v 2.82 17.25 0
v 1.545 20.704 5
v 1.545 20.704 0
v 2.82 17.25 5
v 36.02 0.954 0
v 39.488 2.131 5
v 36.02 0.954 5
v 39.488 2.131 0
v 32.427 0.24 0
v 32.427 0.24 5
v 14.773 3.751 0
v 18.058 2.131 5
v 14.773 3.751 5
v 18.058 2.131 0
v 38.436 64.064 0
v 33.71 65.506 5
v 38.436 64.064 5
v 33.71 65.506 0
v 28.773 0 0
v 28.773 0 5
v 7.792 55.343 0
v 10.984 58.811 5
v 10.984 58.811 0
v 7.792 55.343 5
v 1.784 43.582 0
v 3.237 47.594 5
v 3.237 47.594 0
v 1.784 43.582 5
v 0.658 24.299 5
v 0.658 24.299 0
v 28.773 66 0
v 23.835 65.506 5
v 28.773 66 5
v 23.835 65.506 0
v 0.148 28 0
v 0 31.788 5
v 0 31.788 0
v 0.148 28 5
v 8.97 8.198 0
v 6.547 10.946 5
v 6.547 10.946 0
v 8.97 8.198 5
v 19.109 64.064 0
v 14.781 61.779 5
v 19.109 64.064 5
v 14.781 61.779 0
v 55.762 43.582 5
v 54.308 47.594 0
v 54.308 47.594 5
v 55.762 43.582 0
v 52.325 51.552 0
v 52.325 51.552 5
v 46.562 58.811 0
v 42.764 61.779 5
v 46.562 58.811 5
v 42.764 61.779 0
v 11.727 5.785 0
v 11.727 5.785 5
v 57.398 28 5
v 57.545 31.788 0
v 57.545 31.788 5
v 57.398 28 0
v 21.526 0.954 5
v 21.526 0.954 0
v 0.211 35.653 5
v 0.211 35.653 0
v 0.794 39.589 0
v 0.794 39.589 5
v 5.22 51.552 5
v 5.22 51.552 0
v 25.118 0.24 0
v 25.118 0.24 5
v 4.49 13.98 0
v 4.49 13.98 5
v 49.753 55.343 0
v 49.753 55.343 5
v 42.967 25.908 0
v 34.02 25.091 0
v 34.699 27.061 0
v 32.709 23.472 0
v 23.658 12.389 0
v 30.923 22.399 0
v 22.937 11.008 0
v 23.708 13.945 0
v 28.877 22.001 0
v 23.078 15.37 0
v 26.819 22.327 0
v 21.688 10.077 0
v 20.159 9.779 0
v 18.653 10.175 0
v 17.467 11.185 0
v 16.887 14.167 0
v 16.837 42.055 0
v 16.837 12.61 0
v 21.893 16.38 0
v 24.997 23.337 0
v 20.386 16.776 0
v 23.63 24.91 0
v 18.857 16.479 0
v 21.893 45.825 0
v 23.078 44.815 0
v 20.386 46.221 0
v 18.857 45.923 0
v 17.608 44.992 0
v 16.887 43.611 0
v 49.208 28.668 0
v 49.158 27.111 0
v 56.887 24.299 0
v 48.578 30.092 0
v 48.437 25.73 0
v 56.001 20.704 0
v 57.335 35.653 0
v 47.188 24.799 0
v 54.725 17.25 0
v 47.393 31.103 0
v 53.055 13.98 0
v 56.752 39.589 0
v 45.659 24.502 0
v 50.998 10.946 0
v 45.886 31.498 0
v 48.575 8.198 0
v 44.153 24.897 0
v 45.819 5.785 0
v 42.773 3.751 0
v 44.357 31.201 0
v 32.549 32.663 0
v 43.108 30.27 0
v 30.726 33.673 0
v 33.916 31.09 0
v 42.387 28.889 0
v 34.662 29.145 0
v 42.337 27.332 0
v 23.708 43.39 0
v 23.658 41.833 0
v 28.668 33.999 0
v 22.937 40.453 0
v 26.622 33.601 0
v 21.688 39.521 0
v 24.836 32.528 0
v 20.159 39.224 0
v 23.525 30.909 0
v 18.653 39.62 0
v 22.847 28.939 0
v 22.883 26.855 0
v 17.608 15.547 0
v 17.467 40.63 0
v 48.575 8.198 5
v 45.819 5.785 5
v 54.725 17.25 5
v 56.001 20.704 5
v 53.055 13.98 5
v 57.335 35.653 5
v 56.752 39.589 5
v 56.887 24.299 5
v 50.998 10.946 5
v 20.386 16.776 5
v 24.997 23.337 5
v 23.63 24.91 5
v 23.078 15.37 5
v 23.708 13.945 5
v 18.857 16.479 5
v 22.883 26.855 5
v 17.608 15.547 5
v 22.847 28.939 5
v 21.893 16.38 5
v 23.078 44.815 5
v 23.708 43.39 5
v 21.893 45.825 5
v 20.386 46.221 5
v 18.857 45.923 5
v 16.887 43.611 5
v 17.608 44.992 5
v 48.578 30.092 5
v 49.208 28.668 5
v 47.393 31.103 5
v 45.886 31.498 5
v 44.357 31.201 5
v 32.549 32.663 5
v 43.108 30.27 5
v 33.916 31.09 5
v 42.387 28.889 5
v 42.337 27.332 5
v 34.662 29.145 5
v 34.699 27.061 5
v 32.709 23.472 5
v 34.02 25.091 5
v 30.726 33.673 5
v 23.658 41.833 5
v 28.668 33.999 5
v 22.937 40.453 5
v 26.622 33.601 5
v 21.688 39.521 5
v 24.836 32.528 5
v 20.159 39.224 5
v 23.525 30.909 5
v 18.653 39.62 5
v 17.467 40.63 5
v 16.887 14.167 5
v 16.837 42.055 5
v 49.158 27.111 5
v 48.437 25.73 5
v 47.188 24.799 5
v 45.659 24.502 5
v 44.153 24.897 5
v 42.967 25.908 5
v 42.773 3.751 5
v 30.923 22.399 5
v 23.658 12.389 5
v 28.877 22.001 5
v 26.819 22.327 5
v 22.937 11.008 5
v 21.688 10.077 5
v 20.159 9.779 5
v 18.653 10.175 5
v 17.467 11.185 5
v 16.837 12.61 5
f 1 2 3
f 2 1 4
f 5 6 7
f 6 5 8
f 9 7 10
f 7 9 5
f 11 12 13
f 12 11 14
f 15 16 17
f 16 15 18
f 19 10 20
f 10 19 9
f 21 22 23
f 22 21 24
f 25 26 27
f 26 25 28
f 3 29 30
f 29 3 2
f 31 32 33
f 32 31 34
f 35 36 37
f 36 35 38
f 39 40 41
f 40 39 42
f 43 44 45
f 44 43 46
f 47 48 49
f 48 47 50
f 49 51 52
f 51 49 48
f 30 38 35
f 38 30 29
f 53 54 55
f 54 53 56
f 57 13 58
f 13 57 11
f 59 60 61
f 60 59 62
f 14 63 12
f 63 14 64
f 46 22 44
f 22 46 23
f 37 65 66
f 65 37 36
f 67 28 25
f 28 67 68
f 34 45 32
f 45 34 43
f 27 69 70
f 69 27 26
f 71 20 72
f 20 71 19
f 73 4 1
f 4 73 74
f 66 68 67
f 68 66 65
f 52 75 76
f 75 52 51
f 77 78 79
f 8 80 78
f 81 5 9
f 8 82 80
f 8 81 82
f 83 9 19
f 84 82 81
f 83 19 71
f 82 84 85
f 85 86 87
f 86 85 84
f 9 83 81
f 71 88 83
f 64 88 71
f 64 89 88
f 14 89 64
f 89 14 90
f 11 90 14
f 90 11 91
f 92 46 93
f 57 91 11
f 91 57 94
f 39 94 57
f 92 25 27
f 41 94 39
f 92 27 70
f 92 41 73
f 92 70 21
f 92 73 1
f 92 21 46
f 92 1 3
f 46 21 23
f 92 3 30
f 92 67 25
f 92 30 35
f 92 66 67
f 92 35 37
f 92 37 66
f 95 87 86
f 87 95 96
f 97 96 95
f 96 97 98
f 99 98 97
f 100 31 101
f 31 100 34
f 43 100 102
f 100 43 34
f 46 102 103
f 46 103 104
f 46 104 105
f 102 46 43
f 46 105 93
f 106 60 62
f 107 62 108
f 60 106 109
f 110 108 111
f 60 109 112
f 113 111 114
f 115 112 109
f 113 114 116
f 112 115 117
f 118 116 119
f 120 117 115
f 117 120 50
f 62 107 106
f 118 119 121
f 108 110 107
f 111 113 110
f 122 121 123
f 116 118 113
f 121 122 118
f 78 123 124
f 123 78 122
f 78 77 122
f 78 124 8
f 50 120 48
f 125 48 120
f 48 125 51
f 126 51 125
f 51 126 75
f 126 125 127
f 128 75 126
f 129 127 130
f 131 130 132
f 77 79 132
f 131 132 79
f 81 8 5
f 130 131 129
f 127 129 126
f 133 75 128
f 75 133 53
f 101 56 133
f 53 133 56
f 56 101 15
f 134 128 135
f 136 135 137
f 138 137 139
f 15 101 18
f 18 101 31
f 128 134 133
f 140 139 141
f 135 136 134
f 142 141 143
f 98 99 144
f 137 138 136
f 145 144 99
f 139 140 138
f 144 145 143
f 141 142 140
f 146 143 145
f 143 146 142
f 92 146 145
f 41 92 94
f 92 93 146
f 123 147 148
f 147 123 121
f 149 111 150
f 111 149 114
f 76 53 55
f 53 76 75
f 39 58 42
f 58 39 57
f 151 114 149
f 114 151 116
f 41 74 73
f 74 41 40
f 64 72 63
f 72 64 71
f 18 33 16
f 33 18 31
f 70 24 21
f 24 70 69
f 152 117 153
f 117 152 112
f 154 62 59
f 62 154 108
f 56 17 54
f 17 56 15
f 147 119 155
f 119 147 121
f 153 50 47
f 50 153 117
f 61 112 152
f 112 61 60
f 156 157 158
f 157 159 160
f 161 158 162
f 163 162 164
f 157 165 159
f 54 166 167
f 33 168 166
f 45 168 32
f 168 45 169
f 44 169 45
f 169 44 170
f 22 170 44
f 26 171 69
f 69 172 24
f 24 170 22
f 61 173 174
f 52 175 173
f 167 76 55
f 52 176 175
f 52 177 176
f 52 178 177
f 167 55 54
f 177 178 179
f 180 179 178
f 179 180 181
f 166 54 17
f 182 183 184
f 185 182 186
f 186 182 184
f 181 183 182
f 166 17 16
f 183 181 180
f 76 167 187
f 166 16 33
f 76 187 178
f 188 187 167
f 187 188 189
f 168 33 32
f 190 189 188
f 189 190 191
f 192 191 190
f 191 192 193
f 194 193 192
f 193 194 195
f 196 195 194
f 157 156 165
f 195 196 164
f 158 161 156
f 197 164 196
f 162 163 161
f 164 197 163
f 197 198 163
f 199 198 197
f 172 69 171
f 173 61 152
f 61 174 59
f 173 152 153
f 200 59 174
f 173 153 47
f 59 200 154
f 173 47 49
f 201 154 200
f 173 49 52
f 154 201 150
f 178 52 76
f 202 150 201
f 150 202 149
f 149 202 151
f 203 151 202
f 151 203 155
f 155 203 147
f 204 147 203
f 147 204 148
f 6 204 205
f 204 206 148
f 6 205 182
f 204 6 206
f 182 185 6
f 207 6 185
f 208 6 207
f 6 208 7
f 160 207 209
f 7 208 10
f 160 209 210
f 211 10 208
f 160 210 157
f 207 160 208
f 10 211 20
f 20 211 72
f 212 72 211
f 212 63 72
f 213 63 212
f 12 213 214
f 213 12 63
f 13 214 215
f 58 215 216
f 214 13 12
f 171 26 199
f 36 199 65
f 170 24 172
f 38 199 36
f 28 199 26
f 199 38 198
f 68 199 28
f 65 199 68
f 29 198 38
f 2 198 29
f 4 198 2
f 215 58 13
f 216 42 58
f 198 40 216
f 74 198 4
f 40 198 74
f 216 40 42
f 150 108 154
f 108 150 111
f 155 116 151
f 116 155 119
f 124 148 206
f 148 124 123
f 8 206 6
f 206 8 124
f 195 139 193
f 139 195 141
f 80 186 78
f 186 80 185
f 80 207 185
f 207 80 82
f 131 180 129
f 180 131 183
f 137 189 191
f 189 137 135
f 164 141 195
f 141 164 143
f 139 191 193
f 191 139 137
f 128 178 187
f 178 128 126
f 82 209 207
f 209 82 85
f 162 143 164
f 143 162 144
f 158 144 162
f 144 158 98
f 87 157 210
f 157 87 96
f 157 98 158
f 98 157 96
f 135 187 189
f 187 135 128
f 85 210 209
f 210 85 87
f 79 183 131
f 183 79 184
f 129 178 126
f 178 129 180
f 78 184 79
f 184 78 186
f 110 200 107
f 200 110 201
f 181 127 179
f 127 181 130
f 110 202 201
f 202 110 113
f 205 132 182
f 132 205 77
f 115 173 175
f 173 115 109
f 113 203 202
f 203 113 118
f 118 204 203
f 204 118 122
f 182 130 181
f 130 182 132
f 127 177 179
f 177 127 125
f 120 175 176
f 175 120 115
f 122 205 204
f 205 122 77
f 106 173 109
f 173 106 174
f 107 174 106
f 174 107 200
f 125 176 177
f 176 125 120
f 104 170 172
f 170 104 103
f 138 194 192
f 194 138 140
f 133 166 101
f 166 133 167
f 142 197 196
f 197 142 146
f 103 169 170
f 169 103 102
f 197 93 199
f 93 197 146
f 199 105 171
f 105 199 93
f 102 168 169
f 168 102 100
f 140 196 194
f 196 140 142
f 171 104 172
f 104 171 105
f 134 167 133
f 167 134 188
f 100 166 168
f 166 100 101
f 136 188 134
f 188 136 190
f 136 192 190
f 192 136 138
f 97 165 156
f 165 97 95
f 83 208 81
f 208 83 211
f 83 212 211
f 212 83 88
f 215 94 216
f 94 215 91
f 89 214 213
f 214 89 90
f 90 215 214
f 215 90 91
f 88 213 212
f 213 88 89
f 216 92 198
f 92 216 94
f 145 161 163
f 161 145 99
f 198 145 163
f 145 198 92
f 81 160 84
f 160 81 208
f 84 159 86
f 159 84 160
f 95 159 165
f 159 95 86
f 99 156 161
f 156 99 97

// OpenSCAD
$fn = 32;

// ----------------------------------------------------------------------
// Cam plate: single_lobe cam, base R28
// ----------------------------------------------------------------------

// --- parameters (mm) ---
base_r = 28;              // base circle radius
lobe_h = 10;              // cam lobe rise
bore_r = 6;               // shaft bore radius
plate_t = 5;              // plate thickness, Z (extrusion height)
ring_r = 17;              // lightening ring radius
bolt_r = 3.5;             // lightening hole radius

profile = [[57.398, 28], [57.545, 31.788], [57.335, 35.653], [56.752, 39.589], [55.762, 43.582], [54.308, 47.594], [52.325, 51.552], [49.753, 55.343], [46.562, 58.811], [42.764, 61.779], [38.436, 64.064], [33.71, 65.506], [28.773, 66], [23.835, 65.506], [19.109, 64.064], [14.781, 61.779], [10.984, 58.811], [7.792, 55.343], [5.22, 51.552], [3.237, 47.594], [1.784, 43.582], [0.794, 39.589], [0.211, 35.653], [0, 31.788], [0.148, 28], [0.658, 24.299], [1.545, 20.704], [2.82, 17.25], [4.49, 13.98], [6.547, 10.946], [8.97, 8.198], [11.727, 5.785], [14.773, 3.751], [18.058, 2.131], [21.526, 0.954], [25.118, 0.24], [28.773, 0], [32.427, 0.24], [36.02, 0.954], [39.488, 2.131], [42.773, 3.751], [45.819, 5.785], [48.575, 8.198], [50.998, 10.946], [53.055, 13.98], [54.725, 17.25], [56.001, 20.704], [56.887, 24.299]];  // primary outline, 48 points, counter clockwise
void_1 = [[34.662, 29.145], [33.916, 31.09], [32.549, 32.663], [30.726, 33.673], [28.668, 33.999], [26.622, 33.601], [24.836, 32.528], [23.525, 30.909], [22.847, 28.939], [22.883, 26.855], [23.63, 24.91], [24.997, 23.337], [26.819, 22.327], [28.877, 22.001], [30.923, 22.399], [32.709, 23.472], [34.02, 25.091], [34.699, 27.061]];  // shaft bore, 18 points
void_2 = [[49.208, 28.668], [48.578, 30.092], [47.393, 31.103], [45.886, 31.498], [44.357, 31.201], [43.108, 30.27], [42.387, 28.889], [42.337, 27.332], [42.967, 25.908], [44.153, 24.897], [45.659, 24.502], [47.188, 24.799], [48.437, 25.73], [49.158, 27.111]];  // lightening hole 1, 14 points
void_3 = [[23.708, 43.39], [23.078, 44.815], [21.893, 45.825], [20.386, 46.221], [18.857, 45.923], [17.608, 44.992], [16.887, 43.611], [16.837, 42.055], [17.467, 40.63], [18.653, 39.62], [20.159, 39.224], [21.688, 39.521], [22.937, 40.453], [23.658, 41.833]];  // lightening hole 2, 14 points
void_4 = [[23.708, 13.945], [23.078, 15.37], [21.893, 16.38], [20.386, 16.776], [18.857, 16.479], [17.608, 15.547], [16.887, 14.167], [16.837, 12.61], [17.467, 11.185], [18.653, 10.175], [20.159, 9.779], [21.688, 10.077], [22.937, 11.008], [23.658, 12.389]];  // lightening hole 3, 14 points

// --- the one profile operation ---
difference() {
  linear_extrude(height = plate_t) polygon(points = profile);
  translate([0, 0, -1])
    linear_extrude(height = plate_t + 2) polygon(points = void_1);
  translate([0, 0, -1])
    linear_extrude(height = plate_t + 2) polygon(points = void_2);
  translate([0, 0, -1])
    linear_extrude(height = plate_t + 2) polygon(points = void_3);
  translate([0, 0, -1])
    linear_extrude(height = plate_t + 2) polygon(points = void_4);
}
